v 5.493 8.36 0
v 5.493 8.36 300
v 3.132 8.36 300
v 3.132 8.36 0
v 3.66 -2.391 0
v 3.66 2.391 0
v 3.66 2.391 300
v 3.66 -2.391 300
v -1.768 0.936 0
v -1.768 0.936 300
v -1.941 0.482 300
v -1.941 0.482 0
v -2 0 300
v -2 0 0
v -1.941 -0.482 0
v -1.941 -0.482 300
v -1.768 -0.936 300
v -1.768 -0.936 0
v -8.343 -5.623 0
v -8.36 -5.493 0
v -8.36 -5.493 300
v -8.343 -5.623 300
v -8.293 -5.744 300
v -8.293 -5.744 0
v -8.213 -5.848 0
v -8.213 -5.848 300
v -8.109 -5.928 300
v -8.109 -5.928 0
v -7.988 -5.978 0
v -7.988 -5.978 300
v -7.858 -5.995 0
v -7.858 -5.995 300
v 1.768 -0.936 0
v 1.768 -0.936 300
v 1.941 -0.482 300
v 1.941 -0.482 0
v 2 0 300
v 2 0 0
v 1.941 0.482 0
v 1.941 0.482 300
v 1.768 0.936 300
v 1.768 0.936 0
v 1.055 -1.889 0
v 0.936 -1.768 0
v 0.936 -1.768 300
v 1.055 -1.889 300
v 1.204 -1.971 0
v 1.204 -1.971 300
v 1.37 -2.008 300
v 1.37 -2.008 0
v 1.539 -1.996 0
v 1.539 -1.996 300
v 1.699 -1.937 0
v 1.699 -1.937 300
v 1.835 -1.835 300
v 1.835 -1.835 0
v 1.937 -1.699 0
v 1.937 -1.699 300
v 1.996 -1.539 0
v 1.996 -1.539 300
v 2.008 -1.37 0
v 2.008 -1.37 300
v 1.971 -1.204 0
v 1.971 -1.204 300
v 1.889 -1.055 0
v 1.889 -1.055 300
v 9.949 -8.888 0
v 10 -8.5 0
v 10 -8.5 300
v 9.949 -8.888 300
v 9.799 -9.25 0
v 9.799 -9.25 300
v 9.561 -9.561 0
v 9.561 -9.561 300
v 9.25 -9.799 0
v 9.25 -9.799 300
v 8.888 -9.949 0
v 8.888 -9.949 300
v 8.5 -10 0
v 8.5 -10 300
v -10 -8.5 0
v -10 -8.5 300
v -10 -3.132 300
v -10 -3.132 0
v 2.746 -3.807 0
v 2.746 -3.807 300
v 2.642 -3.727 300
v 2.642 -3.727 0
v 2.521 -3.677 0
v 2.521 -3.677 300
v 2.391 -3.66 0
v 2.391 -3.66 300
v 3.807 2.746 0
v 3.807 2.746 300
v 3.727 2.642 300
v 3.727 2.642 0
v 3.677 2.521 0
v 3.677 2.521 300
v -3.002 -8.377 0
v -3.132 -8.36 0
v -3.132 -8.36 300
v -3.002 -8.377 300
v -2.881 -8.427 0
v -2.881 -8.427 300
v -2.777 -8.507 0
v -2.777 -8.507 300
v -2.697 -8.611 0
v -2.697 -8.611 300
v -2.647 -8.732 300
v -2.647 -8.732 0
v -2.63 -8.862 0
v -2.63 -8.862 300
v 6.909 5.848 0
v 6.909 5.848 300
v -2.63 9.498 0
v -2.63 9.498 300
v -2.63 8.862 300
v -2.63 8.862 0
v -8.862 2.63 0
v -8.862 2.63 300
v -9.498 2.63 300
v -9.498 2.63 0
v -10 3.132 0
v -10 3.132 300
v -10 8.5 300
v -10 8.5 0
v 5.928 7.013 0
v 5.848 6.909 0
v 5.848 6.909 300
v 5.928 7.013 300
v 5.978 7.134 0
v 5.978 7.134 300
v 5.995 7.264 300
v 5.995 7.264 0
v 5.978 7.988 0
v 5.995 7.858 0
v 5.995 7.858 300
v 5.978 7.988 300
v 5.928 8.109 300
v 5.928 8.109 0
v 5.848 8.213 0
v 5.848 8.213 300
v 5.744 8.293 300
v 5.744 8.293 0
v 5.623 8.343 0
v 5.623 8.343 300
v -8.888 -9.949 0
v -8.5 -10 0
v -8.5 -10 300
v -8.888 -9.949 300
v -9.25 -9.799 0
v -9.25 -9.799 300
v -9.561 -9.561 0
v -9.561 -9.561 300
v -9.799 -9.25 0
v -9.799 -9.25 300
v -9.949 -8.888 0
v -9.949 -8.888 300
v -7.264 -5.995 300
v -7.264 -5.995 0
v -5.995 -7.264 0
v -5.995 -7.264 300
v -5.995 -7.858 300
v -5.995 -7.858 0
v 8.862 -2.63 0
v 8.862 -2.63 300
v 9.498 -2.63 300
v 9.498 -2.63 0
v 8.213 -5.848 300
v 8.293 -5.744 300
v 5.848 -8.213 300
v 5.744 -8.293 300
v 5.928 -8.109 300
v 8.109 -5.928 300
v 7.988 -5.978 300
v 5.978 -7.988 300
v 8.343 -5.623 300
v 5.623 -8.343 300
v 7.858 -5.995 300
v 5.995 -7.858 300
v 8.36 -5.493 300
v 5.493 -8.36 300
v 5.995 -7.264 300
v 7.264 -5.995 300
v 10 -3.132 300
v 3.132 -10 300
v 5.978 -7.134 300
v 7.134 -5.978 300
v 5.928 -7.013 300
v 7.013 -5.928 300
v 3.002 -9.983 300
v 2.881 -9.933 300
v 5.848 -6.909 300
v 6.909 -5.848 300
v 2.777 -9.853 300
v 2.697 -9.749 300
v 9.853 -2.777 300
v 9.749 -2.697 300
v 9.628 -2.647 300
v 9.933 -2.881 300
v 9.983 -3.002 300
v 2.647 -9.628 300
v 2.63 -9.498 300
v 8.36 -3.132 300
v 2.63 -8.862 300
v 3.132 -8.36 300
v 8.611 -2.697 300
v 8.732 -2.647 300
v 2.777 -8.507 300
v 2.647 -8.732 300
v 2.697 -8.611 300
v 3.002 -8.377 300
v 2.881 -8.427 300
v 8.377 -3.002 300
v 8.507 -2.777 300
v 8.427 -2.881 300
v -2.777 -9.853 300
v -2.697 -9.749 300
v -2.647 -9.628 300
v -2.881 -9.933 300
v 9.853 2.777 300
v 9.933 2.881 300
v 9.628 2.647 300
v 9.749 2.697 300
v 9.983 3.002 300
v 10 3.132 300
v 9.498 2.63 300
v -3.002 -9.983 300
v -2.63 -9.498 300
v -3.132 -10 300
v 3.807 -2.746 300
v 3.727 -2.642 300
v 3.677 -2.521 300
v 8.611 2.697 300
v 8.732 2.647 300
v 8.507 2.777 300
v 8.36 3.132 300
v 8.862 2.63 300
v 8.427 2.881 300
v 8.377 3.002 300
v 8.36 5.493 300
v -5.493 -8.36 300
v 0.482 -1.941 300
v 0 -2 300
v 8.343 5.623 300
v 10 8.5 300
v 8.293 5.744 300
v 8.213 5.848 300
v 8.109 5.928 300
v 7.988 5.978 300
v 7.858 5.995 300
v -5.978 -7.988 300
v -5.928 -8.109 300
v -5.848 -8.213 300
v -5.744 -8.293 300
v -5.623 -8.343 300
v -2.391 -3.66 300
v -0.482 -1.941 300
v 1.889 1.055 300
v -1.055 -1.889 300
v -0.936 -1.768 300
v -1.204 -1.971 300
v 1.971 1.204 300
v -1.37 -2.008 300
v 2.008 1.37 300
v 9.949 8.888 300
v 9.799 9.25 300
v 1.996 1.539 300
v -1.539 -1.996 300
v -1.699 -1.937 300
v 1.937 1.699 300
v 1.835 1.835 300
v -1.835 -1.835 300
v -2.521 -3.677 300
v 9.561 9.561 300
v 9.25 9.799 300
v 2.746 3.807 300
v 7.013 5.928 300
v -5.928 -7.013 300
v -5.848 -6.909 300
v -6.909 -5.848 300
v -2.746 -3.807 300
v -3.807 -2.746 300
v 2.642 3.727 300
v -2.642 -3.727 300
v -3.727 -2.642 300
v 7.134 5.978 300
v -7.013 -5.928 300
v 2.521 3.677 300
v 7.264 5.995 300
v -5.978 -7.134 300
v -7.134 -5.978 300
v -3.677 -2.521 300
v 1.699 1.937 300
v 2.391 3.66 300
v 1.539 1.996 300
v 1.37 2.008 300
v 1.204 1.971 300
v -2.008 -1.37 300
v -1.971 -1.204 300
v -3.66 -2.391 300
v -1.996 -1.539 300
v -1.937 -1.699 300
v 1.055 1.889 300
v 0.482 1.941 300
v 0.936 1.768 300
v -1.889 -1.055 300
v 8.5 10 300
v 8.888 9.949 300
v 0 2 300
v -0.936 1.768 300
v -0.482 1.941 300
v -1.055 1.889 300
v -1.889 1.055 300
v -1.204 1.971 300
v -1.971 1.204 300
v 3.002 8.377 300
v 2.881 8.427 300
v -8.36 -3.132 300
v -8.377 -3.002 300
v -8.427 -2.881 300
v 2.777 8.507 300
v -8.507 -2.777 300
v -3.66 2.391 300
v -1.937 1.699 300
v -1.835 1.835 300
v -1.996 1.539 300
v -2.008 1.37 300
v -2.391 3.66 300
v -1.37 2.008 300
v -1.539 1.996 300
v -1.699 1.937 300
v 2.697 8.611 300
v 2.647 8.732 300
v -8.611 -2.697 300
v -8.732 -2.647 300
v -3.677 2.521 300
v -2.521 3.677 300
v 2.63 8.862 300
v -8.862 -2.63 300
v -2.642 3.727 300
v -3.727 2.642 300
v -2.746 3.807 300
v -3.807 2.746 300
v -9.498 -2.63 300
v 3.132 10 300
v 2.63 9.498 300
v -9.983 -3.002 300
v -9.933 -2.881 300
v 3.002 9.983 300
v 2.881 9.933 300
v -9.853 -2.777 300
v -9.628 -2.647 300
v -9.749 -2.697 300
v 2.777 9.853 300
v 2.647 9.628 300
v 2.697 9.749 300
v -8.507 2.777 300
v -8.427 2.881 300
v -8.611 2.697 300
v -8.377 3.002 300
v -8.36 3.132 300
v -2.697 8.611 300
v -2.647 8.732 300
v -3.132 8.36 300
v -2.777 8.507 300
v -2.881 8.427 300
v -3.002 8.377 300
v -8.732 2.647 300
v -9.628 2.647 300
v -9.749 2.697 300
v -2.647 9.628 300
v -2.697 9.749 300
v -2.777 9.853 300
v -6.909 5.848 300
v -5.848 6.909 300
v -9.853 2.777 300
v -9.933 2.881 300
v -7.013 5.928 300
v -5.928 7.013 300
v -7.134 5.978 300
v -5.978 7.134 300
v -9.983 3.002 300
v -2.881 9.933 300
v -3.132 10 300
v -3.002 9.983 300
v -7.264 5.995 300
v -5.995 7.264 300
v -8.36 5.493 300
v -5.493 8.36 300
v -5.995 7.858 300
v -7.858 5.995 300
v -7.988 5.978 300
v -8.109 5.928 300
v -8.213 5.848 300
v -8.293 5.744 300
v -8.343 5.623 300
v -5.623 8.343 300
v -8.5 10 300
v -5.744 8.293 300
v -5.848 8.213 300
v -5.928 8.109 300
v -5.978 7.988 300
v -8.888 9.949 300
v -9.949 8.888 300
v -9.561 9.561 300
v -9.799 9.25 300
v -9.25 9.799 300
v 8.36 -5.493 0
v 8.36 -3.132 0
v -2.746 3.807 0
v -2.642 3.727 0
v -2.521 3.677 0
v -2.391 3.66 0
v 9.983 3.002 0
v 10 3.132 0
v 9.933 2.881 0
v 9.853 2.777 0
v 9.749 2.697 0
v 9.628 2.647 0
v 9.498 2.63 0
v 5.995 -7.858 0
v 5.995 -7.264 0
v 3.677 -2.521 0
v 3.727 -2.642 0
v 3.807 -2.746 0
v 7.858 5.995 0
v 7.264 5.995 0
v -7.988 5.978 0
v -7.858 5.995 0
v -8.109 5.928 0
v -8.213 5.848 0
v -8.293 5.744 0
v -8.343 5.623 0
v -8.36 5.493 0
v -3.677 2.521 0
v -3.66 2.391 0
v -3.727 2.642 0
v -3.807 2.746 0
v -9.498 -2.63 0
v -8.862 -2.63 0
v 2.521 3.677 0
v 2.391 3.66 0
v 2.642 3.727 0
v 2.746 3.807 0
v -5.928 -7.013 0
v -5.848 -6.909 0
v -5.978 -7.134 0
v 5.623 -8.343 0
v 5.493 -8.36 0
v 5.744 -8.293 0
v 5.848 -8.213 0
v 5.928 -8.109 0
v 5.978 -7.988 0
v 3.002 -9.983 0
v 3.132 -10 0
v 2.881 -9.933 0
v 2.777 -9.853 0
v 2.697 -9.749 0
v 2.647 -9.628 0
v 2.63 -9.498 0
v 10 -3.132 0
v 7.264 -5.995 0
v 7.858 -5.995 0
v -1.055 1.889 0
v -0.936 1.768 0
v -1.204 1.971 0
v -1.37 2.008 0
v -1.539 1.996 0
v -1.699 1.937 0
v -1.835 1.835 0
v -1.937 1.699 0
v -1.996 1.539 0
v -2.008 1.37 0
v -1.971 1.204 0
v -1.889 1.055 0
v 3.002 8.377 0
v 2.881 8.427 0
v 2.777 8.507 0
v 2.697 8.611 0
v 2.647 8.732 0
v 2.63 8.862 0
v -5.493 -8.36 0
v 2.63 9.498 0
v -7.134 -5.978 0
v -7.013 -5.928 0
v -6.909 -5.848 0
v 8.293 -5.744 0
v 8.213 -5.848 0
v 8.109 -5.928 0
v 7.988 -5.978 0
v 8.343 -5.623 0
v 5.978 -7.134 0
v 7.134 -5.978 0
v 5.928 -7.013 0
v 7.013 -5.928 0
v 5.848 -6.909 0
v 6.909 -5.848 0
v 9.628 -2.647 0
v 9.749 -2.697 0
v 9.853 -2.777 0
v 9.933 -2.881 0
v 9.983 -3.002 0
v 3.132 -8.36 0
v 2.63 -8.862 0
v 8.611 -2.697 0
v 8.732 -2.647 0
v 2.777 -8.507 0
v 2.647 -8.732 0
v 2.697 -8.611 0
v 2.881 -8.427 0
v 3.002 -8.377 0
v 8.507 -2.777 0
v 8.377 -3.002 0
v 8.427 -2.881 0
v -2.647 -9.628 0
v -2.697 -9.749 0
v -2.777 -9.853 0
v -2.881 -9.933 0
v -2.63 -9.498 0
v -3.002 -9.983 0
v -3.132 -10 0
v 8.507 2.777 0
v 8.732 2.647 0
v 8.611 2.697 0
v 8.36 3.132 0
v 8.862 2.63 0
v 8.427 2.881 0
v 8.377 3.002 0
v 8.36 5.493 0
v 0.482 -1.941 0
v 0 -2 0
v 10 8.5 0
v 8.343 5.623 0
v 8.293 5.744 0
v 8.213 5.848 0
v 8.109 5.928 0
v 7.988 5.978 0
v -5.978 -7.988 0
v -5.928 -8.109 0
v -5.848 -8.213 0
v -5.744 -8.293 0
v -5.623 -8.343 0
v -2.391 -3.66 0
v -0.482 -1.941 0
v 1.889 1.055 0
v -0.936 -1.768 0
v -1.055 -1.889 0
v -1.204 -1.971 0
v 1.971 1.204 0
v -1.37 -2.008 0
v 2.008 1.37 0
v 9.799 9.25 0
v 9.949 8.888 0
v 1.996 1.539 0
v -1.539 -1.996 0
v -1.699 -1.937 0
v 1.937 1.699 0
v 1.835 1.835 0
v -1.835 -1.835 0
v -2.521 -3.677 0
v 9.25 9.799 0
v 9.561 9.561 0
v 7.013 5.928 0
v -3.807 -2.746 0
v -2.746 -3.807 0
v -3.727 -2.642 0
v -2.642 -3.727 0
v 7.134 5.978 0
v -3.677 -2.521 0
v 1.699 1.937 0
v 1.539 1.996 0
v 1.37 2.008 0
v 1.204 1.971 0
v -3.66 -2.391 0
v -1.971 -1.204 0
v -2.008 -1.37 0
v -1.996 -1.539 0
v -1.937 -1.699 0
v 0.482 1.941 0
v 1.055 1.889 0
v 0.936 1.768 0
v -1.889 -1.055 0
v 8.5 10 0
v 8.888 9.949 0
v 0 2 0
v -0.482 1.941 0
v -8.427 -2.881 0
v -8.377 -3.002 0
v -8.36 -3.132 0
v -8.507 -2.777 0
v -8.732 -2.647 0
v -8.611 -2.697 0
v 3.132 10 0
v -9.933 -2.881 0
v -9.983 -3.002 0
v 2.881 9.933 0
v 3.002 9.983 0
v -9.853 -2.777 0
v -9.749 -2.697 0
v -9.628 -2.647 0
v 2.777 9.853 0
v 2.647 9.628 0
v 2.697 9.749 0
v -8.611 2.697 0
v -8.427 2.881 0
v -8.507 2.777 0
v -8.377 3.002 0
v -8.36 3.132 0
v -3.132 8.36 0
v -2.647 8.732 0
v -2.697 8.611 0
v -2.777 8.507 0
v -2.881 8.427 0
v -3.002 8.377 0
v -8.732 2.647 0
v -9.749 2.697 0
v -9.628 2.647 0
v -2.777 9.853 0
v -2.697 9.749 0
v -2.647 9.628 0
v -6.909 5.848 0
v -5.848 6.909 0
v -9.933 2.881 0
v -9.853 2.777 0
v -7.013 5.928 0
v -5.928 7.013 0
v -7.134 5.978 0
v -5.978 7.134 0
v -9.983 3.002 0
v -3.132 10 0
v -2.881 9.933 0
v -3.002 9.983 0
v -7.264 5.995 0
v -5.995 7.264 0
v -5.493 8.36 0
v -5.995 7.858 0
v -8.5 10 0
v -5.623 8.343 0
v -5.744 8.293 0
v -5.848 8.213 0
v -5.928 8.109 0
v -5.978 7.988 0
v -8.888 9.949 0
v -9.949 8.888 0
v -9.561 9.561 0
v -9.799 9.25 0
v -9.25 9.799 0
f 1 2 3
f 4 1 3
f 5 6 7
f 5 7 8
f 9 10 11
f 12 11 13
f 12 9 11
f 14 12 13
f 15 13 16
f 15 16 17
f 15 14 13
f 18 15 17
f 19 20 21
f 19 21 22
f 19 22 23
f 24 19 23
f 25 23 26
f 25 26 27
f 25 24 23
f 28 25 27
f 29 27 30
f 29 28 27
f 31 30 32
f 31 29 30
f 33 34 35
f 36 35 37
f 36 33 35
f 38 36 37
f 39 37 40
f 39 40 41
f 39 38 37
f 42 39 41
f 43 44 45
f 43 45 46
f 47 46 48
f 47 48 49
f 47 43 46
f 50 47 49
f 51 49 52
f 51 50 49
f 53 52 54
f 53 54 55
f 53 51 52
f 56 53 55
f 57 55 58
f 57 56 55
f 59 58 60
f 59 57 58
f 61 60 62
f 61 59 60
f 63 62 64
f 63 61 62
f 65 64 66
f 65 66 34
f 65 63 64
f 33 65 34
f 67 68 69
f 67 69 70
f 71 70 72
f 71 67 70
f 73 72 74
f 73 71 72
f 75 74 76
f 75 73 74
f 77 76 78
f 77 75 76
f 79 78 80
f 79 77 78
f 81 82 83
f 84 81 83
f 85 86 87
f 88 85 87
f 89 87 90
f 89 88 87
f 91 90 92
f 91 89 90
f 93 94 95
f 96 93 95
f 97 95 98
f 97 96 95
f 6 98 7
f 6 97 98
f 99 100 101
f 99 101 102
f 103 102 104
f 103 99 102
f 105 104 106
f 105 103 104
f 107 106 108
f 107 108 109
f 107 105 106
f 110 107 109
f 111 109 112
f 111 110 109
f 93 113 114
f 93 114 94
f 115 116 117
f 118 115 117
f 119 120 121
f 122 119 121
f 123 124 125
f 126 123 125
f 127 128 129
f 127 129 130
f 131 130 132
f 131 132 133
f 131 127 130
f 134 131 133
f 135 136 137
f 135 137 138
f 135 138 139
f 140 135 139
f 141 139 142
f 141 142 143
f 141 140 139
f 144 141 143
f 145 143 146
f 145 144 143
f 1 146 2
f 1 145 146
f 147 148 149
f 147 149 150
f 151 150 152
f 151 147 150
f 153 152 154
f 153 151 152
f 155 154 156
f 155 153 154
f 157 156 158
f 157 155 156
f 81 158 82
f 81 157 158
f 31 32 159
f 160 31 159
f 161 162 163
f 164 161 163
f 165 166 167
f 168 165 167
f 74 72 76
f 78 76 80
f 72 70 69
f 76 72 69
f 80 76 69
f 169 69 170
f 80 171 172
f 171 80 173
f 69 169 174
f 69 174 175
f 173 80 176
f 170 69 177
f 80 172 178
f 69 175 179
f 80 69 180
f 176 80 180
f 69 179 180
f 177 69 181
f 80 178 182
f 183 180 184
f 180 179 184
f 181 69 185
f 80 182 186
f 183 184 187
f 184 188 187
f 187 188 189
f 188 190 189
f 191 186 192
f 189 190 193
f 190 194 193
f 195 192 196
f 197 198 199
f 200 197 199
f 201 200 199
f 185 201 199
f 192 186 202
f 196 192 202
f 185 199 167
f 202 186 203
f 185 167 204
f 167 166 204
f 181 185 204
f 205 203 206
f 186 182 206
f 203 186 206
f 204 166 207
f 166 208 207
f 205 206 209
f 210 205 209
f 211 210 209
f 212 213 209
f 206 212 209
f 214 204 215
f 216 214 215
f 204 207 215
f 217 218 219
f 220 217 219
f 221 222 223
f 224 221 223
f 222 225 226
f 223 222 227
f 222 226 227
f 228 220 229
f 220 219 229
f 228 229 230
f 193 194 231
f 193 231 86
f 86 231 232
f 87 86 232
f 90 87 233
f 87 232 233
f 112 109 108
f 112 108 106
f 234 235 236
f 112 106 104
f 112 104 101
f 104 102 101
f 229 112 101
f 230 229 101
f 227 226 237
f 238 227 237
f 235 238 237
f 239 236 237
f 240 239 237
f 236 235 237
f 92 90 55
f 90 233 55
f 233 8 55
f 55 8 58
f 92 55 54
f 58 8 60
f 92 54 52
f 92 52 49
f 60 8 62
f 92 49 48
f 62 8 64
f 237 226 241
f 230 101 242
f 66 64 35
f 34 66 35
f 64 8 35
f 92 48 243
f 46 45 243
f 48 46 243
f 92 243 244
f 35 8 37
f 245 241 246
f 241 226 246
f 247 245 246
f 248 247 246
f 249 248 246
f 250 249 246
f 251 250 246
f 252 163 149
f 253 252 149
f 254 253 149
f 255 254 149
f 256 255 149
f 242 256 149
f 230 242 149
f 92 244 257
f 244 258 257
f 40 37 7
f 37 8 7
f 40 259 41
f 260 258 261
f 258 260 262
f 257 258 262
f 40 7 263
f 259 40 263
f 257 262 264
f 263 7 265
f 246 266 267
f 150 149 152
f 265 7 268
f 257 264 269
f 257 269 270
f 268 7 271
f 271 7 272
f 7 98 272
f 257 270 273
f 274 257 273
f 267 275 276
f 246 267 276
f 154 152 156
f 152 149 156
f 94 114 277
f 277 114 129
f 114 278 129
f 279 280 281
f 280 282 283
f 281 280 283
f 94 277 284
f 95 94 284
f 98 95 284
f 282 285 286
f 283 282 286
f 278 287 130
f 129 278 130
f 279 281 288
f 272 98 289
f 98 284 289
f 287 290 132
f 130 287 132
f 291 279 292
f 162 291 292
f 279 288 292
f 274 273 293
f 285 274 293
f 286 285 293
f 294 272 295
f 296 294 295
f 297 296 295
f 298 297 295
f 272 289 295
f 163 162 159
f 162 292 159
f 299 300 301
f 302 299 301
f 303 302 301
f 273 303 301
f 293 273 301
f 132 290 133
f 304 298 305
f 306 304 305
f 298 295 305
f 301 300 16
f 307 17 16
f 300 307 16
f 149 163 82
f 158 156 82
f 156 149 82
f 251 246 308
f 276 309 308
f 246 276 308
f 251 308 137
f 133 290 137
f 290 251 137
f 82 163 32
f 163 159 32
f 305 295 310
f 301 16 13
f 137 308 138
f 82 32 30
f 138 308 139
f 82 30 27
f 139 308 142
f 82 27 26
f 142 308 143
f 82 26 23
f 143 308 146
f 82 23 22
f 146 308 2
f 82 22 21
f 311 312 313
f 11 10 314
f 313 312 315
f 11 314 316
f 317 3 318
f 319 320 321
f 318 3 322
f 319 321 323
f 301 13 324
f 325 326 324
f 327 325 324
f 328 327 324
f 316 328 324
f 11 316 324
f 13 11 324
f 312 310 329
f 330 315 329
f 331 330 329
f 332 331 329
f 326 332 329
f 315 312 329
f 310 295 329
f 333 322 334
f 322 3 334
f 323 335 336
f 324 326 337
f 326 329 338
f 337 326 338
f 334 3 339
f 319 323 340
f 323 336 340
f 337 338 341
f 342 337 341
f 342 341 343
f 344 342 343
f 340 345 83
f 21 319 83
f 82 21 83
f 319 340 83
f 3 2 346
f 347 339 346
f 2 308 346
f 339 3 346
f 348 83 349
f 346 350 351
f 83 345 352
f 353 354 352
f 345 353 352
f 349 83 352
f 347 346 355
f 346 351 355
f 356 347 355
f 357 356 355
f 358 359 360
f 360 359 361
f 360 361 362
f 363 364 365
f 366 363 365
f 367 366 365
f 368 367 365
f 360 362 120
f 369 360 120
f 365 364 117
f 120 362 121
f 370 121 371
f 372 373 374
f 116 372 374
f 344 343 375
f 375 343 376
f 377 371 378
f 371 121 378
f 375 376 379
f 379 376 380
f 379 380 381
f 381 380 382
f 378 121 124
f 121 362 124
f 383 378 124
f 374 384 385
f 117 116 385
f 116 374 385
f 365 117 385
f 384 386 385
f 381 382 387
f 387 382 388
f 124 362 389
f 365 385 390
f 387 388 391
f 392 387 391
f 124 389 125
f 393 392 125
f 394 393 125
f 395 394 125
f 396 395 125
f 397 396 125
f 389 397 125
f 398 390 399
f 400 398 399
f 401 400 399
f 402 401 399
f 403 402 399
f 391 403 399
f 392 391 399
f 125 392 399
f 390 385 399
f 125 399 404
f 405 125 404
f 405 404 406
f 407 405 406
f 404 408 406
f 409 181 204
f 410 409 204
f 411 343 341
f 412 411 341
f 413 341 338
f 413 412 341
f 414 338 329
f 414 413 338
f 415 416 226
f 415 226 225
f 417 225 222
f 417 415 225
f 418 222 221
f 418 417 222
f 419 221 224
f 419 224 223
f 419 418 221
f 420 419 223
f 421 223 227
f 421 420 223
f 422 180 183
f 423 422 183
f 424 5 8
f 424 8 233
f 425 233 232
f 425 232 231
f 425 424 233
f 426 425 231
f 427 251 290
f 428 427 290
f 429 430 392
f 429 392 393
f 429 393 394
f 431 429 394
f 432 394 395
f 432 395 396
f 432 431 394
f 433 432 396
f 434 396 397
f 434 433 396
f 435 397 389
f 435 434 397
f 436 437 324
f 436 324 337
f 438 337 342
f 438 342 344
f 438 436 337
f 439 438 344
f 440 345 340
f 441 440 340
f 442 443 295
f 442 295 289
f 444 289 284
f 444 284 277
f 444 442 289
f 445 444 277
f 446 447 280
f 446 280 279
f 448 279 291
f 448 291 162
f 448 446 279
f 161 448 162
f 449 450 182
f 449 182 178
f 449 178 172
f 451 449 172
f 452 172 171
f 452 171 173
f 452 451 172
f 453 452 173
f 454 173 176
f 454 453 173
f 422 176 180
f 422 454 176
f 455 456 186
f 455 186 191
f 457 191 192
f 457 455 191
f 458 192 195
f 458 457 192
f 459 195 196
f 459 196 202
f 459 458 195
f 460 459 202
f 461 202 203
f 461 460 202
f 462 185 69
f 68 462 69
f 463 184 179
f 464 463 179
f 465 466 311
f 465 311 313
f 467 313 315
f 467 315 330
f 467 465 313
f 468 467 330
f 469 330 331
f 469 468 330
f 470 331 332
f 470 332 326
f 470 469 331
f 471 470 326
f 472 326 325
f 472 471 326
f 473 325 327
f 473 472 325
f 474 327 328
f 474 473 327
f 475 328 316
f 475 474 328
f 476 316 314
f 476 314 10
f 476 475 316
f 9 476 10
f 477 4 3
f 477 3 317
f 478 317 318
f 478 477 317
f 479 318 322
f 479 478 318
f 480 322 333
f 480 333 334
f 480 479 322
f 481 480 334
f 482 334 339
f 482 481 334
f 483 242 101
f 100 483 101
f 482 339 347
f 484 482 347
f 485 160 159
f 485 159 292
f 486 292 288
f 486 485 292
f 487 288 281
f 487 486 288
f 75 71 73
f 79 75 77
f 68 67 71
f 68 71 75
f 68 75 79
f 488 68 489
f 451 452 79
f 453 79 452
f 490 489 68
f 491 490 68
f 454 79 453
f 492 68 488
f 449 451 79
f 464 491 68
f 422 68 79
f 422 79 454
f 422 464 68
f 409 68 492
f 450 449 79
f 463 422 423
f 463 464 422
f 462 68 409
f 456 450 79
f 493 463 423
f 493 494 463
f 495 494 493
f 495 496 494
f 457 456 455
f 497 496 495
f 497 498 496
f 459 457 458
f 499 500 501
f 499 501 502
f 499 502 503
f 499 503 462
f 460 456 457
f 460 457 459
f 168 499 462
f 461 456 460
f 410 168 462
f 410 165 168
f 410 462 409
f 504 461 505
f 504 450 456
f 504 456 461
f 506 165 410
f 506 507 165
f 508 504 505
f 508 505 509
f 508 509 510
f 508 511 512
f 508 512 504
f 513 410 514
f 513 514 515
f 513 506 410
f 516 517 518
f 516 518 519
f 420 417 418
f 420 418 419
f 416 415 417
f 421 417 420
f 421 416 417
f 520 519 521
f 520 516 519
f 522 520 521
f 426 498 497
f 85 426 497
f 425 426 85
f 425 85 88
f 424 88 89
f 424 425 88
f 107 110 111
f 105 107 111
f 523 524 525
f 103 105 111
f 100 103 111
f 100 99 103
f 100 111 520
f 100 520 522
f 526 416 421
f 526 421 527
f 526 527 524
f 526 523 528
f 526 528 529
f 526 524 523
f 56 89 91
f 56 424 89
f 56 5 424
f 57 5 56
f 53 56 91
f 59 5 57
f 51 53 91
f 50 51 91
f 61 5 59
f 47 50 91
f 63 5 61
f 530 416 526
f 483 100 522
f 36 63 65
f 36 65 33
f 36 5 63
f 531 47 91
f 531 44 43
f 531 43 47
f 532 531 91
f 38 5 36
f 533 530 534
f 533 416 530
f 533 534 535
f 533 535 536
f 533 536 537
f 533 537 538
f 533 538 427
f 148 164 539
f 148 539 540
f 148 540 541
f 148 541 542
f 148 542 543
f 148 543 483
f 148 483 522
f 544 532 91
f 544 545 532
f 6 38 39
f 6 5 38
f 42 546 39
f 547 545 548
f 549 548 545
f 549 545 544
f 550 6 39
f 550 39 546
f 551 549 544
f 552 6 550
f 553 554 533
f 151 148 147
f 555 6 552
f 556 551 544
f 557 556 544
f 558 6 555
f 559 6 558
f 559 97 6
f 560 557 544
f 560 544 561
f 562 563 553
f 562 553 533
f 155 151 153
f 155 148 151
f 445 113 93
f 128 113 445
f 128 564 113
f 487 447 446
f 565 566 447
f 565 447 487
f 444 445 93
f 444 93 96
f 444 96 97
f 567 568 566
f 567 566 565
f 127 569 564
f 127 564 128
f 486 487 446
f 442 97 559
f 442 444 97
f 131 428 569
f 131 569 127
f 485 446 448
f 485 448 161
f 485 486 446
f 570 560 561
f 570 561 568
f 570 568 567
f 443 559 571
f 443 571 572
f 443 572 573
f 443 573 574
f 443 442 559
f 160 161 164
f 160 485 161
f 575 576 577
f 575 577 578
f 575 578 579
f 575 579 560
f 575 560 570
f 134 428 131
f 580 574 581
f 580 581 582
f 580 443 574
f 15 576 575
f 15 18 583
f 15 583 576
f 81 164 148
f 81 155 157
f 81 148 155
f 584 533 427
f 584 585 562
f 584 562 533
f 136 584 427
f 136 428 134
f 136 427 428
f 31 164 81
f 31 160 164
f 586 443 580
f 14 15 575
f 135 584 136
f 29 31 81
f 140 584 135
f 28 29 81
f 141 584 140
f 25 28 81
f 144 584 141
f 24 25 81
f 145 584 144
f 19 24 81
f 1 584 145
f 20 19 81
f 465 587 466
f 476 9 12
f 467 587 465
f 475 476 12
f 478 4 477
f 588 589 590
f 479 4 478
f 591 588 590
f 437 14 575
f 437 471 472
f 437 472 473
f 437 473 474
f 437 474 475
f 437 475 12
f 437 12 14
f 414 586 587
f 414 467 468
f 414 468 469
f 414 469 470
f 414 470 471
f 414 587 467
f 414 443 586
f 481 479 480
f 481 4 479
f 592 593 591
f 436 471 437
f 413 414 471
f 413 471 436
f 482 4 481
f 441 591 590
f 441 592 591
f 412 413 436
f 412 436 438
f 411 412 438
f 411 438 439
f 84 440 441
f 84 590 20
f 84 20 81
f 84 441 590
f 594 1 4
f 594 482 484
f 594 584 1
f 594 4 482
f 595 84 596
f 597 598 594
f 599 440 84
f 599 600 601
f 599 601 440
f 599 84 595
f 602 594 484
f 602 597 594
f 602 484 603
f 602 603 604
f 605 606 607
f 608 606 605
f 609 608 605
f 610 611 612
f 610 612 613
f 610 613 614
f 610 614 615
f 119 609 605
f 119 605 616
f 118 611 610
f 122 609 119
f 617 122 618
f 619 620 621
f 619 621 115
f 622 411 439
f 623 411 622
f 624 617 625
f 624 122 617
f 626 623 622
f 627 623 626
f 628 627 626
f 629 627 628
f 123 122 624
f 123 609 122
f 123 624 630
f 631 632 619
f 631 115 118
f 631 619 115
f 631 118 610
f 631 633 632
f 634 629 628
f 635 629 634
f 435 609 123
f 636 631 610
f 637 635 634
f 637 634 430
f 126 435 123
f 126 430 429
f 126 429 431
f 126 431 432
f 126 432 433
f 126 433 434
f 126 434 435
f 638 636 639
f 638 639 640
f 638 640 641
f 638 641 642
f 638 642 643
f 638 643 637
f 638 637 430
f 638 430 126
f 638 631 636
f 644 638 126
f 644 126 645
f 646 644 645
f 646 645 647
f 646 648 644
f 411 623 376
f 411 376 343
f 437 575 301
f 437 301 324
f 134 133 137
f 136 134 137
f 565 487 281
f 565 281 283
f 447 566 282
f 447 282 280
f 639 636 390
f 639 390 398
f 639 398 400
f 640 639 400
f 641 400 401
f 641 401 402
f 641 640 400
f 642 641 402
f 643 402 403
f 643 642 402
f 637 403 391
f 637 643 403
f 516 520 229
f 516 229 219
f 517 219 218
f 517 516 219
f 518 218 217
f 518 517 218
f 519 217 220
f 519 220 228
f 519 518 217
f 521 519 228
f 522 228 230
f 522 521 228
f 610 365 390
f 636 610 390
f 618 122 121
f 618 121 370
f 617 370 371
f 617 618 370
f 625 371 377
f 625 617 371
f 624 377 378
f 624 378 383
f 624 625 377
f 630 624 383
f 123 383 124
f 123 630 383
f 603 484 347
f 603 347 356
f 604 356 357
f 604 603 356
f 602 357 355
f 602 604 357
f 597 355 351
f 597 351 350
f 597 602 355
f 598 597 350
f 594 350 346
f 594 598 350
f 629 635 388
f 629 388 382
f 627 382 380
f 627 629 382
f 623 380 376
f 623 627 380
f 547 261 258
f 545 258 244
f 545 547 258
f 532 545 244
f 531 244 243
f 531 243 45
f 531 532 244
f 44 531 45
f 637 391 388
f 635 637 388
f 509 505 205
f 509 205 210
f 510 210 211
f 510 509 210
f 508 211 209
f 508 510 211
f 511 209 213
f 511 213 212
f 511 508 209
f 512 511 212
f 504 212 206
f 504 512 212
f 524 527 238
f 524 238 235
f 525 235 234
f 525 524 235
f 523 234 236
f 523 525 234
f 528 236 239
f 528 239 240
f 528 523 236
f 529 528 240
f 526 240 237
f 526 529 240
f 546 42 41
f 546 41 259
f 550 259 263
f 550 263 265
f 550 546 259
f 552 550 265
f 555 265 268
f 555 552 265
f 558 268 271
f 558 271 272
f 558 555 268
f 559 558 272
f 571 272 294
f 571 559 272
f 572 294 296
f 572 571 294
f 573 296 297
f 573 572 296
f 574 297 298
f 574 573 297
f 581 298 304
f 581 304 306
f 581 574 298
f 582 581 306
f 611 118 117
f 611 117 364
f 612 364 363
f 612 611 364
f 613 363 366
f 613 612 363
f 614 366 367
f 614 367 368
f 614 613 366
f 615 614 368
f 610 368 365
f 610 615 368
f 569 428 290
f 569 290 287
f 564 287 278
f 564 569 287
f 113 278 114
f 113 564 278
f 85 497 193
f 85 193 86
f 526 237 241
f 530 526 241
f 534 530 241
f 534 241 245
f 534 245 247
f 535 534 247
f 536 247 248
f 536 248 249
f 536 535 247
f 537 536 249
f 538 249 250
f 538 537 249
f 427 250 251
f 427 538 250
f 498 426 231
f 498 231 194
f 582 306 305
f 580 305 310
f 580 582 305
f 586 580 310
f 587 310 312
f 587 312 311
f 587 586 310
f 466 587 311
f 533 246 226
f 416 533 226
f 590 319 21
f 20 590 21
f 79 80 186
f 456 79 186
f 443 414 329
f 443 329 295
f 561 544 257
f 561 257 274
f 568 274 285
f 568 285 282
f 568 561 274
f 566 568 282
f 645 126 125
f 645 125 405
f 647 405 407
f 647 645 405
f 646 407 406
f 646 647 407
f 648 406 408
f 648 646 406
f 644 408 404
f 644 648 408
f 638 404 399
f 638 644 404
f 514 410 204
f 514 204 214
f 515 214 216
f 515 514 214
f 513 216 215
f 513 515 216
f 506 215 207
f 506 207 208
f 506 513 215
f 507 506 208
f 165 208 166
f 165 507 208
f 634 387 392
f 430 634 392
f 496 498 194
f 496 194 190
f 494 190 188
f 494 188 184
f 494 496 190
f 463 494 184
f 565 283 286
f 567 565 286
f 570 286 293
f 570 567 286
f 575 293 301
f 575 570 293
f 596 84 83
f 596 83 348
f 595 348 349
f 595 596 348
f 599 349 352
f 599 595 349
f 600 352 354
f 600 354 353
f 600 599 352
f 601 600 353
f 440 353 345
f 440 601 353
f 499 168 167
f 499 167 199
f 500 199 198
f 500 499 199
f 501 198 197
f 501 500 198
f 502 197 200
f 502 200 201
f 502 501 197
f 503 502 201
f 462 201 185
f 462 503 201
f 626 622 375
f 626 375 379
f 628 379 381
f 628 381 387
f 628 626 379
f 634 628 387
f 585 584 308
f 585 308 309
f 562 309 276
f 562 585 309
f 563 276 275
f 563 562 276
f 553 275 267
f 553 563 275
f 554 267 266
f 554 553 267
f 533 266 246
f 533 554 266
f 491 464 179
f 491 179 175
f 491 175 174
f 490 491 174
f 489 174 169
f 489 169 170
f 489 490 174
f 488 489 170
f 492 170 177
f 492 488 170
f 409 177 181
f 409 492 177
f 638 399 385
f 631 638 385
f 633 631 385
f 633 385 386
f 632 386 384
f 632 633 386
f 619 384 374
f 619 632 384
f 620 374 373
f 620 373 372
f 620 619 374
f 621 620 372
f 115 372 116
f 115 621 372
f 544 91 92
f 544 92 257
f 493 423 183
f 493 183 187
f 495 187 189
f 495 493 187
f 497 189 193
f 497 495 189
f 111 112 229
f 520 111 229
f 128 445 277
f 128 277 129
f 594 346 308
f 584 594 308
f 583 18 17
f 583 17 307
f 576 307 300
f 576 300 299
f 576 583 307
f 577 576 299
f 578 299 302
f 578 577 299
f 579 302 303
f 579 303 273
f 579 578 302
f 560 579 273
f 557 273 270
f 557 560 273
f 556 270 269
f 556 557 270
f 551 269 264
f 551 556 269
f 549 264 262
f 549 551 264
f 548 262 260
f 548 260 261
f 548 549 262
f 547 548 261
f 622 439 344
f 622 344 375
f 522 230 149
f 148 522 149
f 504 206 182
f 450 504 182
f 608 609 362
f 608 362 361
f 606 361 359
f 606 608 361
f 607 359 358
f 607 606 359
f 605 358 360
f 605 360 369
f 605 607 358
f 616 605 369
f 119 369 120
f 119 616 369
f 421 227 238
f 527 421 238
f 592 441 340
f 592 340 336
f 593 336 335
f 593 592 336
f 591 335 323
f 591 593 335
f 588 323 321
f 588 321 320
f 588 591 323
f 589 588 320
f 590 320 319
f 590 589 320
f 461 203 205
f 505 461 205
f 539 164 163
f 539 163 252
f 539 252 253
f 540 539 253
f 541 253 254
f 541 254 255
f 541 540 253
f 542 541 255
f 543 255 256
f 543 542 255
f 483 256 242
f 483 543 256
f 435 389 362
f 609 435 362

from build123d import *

# Parameters (mm, degrees)
BOSS_EXTRUDE1_DEPTH = 300


with BuildPart() as part:
    # Sketch1 → Boss-Extrude1 (new body)
    with BuildSketch(Plane.XY):
        with BuildLine():
            Line((-2.746356642, -3.807016814), (-5.847983186, -6.908643358))
            ThreePointArc((-5.847983186, -6.908643358), (-5.956791575, -7.07148662), (-5.995, -7.263573344))
            Line((-5.995, -7.263573344), (-5.995, -7.858053199))
            ThreePointArc((-5.995, -7.858053199), (-5.847983186, -8.212983186), (-5.493053199, -8.36))
            Line((-5.493053199, -8.36), (-3.131946801, -8.36))
            ThreePointArc((-3.131946801, -8.36), (-2.777016814, -8.507016814), (-2.63, -8.861946801))
            Line((-2.63, -8.861946801), (-2.63, -9.498053199))
            ThreePointArc((-2.63, -9.498053199), (-2.777016814, -9.852983186), (-3.131946801, -10))
            Line((-3.131946801, -10), (-8.5, -10))
            ThreePointArc((-8.5, -10), (-9.560660172, -9.560660172), (-10, -8.5))
            Line((-10, -8.5), (-10, -3.131946801))
            ThreePointArc((-10, -3.131946801), (-9.852983186, -2.777016814), (-9.498053199, -2.63))
            Line((-9.498053199, -2.63), (-8.861946801, -2.63))
            ThreePointArc((-8.861946801, -2.63), (-8.507016814, -2.777016814), (-8.36, -3.131946801))
            Line((-8.36, -3.131946801), (-8.36, -5.493053199))
            ThreePointArc((-8.36, -5.493053199), (-8.212983186, -5.847983186), (-7.858053199, -5.995))
            Line((-7.858053199, -5.995), (-7.263573344, -5.995))
            ThreePointArc((-7.263573344, -5.995), (-7.07148662, -5.956791575), (-6.908643358, -5.847983186))
            Line((-6.908643358, -5.847983186), (-3.807016814, -2.746356642))
            ThreePointArc((-3.807016814, -2.746356642), (-3.698208425, -2.58351338), (-3.66, -2.391426656))
            Line((-3.66, -2.391426656), (-3.66, 2.391426656))
            ThreePointArc((-3.66, 2.391426656), (-3.698208425, 2.58351338), (-3.807016814, 2.746356642))
            Line((-3.807016814, 2.746356642), (-6.908643358, 5.847983186))
            ThreePointArc((-6.908643358, 5.847983186), (-7.07148662, 5.956791575), (-7.263573344, 5.995))
            Line((-7.263573344, 5.995), (-7.858053199, 5.995))
            ThreePointArc((-7.858053199, 5.995), (-8.212983186, 5.847983186), (-8.36, 5.493053199))
            Line((-8.36, 5.493053199), (-8.36, 3.131946801))
            ThreePointArc((-8.36, 3.131946801), (-8.507016814, 2.777016814), (-8.861946801, 2.63))
            Line((-8.861946801, 2.63), (-9.498053199, 2.63))
            ThreePointArc((-9.498053199, 2.63), (-9.852983186, 2.777016814), (-10, 3.131946801))
            Line((-10, 3.131946801), (-10, 8.5))
            ThreePointArc((-10, 8.5), (-9.560660172, 9.560660172), (-8.5, 10))
            Line((-8.5, 10), (-3.131946801, 10))
            ThreePointArc((-3.131946801, 10), (-2.777016814, 9.852983186), (-2.63, 9.498053199))
            Line((-2.63, 9.498053199), (-2.63, 8.861946801))
            ThreePointArc((-2.63, 8.861946801), (-2.777016814, 8.507016814), (-3.131946801, 8.36))
            Line((-3.131946801, 8.36), (-5.493053199, 8.36))
            ThreePointArc((-5.493053199, 8.36), (-5.847983186, 8.212983186), (-5.995, 7.858053199))
            Line((-5.995, 7.858053199), (-5.995, 7.263573344))
            ThreePointArc((-5.995, 7.263573344), (-5.956791575, 7.07148662), (-5.847983186, 6.908643358))
            Line((-5.847983186, 6.908643358), (-2.746356642, 3.807016814))
            ThreePointArc((-2.746356642, 3.807016814), (-2.58351338, 3.698208425), (-2.391426656, 3.66))
            Line((-2.391426656, 3.66), (2.391426656, 3.66))
            ThreePointArc((2.391426656, 3.66), (2.58351338, 3.698208425), (2.746356642, 3.807016814))
            Line((2.746356642, 3.807016814), (5.847983186, 6.908643358))
            ThreePointArc((5.847983186, 6.908643358), (5.956791575, 7.07148662), (5.995, 7.263573344))
            Line((5.995, 7.263573344), (5.995, 7.858053199))
            ThreePointArc((5.995, 7.858053199), (5.847983186, 8.212983186), (5.493053199, 8.36))
            Line((5.493053199, 8.36), (3.131946801, 8.36))
            ThreePointArc((3.131946801, 8.36), (2.777016814, 8.507016814), (2.63, 8.861946801))
            Line((2.63, 8.861946801), (2.63, 9.498053199))
            ThreePointArc((2.63, 9.498053199), (2.777016814, 9.852983186), (3.131946801, 10))
            Line((3.131946801, 10), (8.5, 10))
            ThreePointArc((8.5, 10), (9.560660172, 9.560660172), (10, 8.5))
            Line((10, 8.5), (10, 3.131946801))
            ThreePointArc((10, 3.131946801), (9.852983186, 2.777016814), (9.498053199, 2.63))
            Line((9.498053199, 2.63), (8.861946801, 2.63))
            ThreePointArc((8.861946801, 2.63), (8.507016814, 2.777016814), (8.36, 3.131946801))
            Line((8.36, 3.131946801), (8.36, 5.493053199))
            ThreePointArc((8.36, 5.493053199), (8.212983186, 5.847983186), (7.858053199, 5.995))
            Line((7.858053199, 5.995), (7.263573344, 5.995))
            ThreePointArc((7.263573344, 5.995), (7.07148662, 5.956791575), (6.908643358, 5.847983186))
            Line((6.908643358, 5.847983186), (3.807016814, 2.746356642))
            ThreePointArc((3.807016814, 2.746356642), (3.698208425, 2.58351338), (3.66, 2.391426656))
            Line((3.66, 2.391426656), (3.66, -2.391426656))
            ThreePointArc((3.66, -2.391426656), (3.698208425, -2.58351338), (3.807016814, -2.746356642))
            Line((3.807016814, -2.746356642), (6.908643358, -5.847983186))
            ThreePointArc((6.908643358, -5.847983186), (7.07148662, -5.956791575), (7.263573344, -5.995))
            Line((7.263573344, -5.995), (7.858053199, -5.995))
            ThreePointArc((7.858053199, -5.995), (8.212983186, -5.847983186), (8.36, -5.493053199))
            Line((8.36, -5.493053199), (8.36, -3.131946801))
            ThreePointArc((8.36, -3.131946801), (8.507016814, -2.777016814), (8.861946801, -2.63))
            Line((8.861946801, -2.63), (9.498053199, -2.63))
            ThreePointArc((9.498053199, -2.63), (9.852983186, -2.777016814), (10, -3.131946801))
            Line((10, -3.131946801), (10, -8.5))
            ThreePointArc((10, -8.5), (9.560660172, -9.560660172), (8.5, -10))
            Line((8.5, -10), (3.131946801, -10))
            ThreePointArc((3.131946801, -10), (2.777016814, -9.852983186), (2.63, -9.498053199))
            Line((2.63, -9.498053199), (2.63, -8.861946801))
            ThreePointArc((2.63, -8.861946801), (2.777016814, -8.507016814), (3.131946801, -8.36))
            Line((3.131946801, -8.36), (5.493053199, -8.36))
            ThreePointArc((5.493053199, -8.36), (5.847983186, -8.212983186), (5.995, -7.858053199))
            Line((5.995, -7.858053199), (5.995, -7.263573344))
            ThreePointArc((5.995, -7.263573344), (5.956791575, -7.07148662), (5.847983186, -6.908643358))
            Line((5.847983186, -6.908643358), (2.746356642, -3.807016814))
            ThreePointArc((2.746356642, -3.807016814), (2.58351338, -3.698208425), (2.391426656, -3.66))
            Line((2.391426656, -3.66), (-2.391426656, -3.66))
            ThreePointArc((-2.391426656, -3.66), (-2.58351338, -3.698208425), (-2.746356642, -3.807016814))
        make_face()
        with BuildLine():
            ThreePointArc((-1.767678053, 0.935582333), (-2, 0), (-1.767678053, -0.935582333))
            ThreePointArc((-1.767678053, -0.935582333), (-1.834942097, -1.834942097), (-0.935582333, -1.767678053))
            ThreePointArc((-0.935582333, -1.767678053), (0, -2), (0.935582333, -1.767678053))
            ThreePointArc((0.935582333, -1.767678053), (1.834942097, -1.834942097), (1.767678053, -0.935582333))
            ThreePointArc((1.767678053, -0.935582333), (2, 0), (1.767678053, 0.935582333))
            ThreePointArc((1.767678053, 0.935582333), (1.834942097, 1.834942097), (0.935582333, 1.767678053))
            ThreePointArc((0.935582333, 1.767678053), (0, 2), (-0.935582333, 1.767678053))
            ThreePointArc((-0.935582333, 1.767678053), (-1.834942097, 1.834942097), (-1.767678053, 0.935582333))
        make_face(mode=Mode.SUBTRACT)
    extrude(amount=BOSS_EXTRUDE1_DEPTH)


solid = part.part
